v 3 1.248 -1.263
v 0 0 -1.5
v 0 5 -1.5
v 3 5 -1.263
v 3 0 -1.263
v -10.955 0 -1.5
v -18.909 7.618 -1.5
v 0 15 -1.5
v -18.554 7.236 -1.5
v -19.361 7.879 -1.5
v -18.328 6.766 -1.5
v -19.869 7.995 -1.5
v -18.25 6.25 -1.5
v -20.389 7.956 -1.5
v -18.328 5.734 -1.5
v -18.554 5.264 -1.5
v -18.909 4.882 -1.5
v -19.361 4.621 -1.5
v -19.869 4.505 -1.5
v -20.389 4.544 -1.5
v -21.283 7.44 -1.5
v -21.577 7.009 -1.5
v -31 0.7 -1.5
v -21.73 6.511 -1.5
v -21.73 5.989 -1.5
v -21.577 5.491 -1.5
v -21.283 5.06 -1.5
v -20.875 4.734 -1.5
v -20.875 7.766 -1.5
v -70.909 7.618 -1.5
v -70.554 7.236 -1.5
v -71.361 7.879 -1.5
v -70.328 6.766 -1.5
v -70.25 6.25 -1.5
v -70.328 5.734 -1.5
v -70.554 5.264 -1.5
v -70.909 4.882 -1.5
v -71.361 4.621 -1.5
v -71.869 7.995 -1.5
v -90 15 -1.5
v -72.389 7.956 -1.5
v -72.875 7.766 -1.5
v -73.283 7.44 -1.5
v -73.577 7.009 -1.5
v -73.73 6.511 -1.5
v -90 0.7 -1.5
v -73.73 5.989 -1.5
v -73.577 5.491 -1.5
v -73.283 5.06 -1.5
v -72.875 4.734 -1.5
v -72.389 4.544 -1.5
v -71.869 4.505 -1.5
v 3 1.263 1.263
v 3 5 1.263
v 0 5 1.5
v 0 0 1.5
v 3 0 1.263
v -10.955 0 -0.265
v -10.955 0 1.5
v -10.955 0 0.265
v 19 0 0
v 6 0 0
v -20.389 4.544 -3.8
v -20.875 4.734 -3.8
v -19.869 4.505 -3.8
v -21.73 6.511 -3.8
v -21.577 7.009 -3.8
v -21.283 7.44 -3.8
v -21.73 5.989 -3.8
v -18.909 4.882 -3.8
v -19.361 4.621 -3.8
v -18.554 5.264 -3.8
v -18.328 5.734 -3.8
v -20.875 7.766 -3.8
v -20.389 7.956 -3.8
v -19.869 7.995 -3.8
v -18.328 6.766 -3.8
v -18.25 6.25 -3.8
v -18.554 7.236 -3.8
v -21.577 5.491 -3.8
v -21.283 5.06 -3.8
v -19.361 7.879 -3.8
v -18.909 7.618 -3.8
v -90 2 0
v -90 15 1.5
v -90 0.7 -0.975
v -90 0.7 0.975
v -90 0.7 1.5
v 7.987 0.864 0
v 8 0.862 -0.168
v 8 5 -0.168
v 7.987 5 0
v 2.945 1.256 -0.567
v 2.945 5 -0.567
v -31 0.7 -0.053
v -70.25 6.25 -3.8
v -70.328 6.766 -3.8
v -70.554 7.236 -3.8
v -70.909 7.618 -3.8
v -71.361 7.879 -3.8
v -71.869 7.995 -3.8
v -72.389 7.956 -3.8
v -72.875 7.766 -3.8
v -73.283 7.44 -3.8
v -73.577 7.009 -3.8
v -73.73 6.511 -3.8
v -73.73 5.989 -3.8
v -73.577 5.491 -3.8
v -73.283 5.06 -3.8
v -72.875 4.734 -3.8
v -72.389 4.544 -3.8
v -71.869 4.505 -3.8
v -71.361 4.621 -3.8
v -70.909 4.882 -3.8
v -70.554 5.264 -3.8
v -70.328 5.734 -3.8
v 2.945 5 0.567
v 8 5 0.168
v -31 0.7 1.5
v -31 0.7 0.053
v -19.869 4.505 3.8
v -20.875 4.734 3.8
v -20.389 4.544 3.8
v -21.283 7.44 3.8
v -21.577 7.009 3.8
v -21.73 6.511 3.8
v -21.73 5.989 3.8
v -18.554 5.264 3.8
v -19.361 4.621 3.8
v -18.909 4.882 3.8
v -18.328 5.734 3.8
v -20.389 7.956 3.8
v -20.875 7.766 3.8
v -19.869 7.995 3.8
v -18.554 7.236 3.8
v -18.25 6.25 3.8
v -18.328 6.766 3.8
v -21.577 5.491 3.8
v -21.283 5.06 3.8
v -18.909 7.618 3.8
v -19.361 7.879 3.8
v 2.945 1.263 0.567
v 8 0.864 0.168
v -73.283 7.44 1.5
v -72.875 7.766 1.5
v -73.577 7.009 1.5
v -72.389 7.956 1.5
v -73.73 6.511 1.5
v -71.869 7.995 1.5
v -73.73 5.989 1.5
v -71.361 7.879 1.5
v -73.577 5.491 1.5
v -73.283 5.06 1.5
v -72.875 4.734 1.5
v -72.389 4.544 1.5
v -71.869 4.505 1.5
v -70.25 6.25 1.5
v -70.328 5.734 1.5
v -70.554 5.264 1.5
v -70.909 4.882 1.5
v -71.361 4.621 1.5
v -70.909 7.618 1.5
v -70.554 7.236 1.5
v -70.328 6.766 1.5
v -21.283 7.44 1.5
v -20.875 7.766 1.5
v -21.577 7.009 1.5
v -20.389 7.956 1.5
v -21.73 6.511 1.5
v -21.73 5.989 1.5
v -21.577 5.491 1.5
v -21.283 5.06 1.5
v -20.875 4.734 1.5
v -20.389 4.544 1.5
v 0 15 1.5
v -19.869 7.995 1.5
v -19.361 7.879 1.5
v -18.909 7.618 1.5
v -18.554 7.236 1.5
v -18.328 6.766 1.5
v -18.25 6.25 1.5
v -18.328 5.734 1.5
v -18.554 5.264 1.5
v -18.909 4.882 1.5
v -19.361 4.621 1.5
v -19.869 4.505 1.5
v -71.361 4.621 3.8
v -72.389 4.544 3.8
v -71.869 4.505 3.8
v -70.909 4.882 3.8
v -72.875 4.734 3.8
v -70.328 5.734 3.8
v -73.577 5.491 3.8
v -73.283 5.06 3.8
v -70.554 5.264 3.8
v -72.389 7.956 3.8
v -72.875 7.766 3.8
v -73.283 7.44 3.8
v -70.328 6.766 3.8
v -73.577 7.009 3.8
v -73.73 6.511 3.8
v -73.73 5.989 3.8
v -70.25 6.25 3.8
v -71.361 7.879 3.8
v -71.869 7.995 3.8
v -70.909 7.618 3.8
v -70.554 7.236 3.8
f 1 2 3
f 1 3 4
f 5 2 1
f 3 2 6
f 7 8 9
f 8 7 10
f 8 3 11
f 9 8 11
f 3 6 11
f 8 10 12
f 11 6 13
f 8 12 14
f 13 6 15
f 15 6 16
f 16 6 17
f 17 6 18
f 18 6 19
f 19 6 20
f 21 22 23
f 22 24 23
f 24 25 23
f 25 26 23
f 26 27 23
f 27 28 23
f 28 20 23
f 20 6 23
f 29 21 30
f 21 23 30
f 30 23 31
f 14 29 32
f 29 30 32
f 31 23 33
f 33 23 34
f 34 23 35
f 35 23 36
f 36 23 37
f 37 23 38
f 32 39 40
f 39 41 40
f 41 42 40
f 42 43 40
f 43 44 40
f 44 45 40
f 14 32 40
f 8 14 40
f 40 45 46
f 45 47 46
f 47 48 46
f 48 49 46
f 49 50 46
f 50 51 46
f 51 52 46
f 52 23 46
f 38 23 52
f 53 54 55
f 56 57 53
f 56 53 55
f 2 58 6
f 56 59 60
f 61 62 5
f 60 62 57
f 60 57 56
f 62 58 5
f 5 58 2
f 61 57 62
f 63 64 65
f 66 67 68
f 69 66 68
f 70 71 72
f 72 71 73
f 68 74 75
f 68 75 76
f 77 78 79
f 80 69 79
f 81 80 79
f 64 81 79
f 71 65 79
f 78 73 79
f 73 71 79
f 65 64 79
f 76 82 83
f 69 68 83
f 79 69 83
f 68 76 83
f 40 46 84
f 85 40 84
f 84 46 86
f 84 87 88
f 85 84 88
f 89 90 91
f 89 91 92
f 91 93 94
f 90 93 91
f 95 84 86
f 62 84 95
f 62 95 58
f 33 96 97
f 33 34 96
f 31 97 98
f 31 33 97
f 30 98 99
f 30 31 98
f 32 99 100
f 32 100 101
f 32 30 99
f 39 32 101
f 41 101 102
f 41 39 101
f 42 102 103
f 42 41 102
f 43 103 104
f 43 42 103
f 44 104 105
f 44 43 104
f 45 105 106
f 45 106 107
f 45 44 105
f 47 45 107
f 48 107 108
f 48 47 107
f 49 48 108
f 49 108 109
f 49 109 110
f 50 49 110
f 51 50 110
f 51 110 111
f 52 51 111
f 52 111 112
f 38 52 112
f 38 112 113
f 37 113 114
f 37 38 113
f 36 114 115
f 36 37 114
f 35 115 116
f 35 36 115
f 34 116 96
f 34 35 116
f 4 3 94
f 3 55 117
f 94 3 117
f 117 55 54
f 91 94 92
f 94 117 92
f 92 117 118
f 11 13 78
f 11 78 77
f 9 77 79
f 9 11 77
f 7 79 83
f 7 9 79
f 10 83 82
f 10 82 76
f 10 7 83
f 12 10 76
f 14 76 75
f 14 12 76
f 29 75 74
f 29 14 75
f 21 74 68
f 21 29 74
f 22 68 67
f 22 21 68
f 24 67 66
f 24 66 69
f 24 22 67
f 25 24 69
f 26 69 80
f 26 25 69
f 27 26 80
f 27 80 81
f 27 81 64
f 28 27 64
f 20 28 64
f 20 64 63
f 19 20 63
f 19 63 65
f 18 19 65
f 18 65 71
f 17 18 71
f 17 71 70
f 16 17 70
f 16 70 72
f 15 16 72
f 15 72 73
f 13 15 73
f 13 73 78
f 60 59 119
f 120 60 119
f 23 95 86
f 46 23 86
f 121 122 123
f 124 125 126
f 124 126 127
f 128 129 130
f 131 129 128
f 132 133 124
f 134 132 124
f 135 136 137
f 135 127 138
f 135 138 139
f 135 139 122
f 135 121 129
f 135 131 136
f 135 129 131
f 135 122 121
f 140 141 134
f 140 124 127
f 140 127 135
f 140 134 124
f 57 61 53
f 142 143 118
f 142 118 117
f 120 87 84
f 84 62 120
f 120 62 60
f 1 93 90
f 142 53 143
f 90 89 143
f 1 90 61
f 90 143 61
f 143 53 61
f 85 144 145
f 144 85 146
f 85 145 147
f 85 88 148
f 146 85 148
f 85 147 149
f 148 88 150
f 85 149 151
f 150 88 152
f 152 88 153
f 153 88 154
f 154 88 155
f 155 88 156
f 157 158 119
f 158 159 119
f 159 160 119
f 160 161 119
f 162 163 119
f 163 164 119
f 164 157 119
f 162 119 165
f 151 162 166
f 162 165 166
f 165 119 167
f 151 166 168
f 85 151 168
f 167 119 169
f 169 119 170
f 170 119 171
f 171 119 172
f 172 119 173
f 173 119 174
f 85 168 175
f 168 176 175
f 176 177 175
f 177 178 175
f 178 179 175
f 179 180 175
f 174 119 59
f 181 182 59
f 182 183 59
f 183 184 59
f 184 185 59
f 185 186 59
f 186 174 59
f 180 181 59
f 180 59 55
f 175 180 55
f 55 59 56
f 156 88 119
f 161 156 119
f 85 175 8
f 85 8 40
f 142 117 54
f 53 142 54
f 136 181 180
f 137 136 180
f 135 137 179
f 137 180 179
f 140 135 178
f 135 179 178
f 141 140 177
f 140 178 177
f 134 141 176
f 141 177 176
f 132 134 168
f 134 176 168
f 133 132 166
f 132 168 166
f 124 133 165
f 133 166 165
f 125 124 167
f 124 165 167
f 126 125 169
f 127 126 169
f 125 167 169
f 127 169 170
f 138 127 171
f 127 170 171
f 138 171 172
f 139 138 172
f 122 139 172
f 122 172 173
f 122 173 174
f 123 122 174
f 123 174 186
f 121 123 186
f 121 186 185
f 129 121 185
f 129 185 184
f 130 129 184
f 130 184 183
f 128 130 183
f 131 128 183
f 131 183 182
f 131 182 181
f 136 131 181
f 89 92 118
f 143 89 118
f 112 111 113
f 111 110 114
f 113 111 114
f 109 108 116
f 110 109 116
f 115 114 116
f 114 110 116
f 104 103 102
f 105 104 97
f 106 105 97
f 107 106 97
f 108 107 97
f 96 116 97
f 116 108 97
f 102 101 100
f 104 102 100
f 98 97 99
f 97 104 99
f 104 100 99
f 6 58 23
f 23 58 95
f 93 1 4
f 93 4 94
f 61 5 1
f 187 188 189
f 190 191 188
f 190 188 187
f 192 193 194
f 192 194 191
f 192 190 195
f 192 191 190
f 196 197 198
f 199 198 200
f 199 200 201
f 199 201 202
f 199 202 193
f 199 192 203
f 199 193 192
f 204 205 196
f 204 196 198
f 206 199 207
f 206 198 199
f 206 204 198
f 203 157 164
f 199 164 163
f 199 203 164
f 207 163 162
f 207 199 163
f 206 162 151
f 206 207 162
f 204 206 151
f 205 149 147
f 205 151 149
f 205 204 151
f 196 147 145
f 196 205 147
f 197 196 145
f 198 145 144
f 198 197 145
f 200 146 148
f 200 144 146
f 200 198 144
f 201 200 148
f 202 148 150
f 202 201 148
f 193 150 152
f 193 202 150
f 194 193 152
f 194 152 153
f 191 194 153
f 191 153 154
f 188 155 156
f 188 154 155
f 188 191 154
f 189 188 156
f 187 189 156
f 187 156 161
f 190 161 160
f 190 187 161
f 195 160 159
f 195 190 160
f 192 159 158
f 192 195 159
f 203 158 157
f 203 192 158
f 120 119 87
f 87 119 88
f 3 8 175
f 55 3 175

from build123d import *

# Parameters (mm, degrees)
F1_DEPTH  = 1.5
F3_DEPTH  = 25
F4_DEPTH  = 5
F6_W      = 90
F6_H      = 3
F7_DEPTH  = 5
F5_R      = 1.75
F8_DEPTH  = 3.8
F9_W      = 16.7752551286
F9_H      = 3
F9_W_2    = 2.4494897428
F9_W_3    = 49.5505102572
F9_W_4    = 18.7752551286
F10_DEPTH = 10
F15_DEPTH = 5.301


# Not quite as in the source:
# - ends of sketch curves that miss each other by under 0.0002 mm in the source are joined


with BuildPart() as f1:
    # F0 (on Front) → F1 (new body)
    with BuildSketch(Plane.XZ):
        Polygon((0, -0.8), (0, -1.5), (3, -1.2631578947), (2.9450791466, -0.5674937516), align=None)
        Polygon((2.9450791466, -0.5674937516), (3, -1.2631578947), (19, 0), (10.1333333333, 0), (8, -0.1684210526), align=None)
        Polygon((0, 0), (0, -0.8), (2.9450791466, -0.5674937516), (8, -0.1684210526), (7.9867036011, 0), align=None)
        Polygon((10.1333333333, 0), (19, 0), (3, 1.2631578947), (2.9450791466, 0.5674937516), (8, 0.1684210526), align=None)
        Polygon((0, 0.8), (0, 0), (7.9867036011, 0), (8, 0.1684210526), (2.9450791466, 0.5674937516), align=None)
        Polygon((2.9450791466, 0.5674937516), (3, 1.2631578947), (0, 1.5), (0, 0.8), align=None)
        Polygon((8, -0.1684210526), (10.1333333333, 0), (7.9867036011, 0), align=None)
        Polygon((7.9867036011, 0), (10.1333333333, 0), (8, 0.1684210526), align=None)
    extrude(amount=-F1_DEPTH)

    # F2 (on face) → F3 (cut)
    with BuildSketch(Plane(origin=(0.117687543, 0, 1.4907088782), x_dir=(0.9968981487, 0, -0.0787024854), z_dir=(0.0787024854, 0, 0.9968981487))):
        Polygon((18.9410648244, 1.5), (-0.1180537281, 1.5), (18.9410648244, 0), align=None)
    extrude(amount=-F3_DEPTH, mode=Mode.SUBTRACT)

    # F0 (on Front) → F4 (join)
    with BuildSketch(Plane.XZ):
        Polygon((0, 0.8), (0, 0), (7.9867036011, 0), (8, 0.1684210526), (2.9450791466, 0.5674937516), align=None)
        Polygon((0, 0), (0, -0.8), (2.9450791466, -0.5674937516), (8, -0.1684210526), (7.9867036011, 0), align=None)
        Polygon((0, -0.8), (0, -1.5), (3, -1.2631578947), (2.9450791466, -0.5674937516), align=None)
        Polygon((2.9450791466, 0.5674937516), (3, 1.2631578947), (0, 1.5), (0, 0.8), align=None)
    extrude(amount=-F4_DEPTH)

    # F6 (on face) → F7 (join, through all)
    with BuildSketch(Plane.XZ):
        with Locations((-45, 0)):
            Rectangle(F6_W, F6_H)
    extrude(amount=-F7_DEPTH)

    # F5 (on Top) → F8 (join, symmetric)
    with BuildSketch(Plane.XY):
        with Locations((-20, 6.25)):
            Circle(F5_R)
        with Locations((-72, 6.25)):
            Circle(F5_R)
    extrude(amount=F8_DEPTH, both=True)

    # F9 (on face) → F10 (join)
    with BuildSketch(Plane(origin=(0, 5, 0), x_dir=(-1, 0, 0), z_dir=(0, 1, 0))):
        with Locations((81.6123724357, 0)):
            Rectangle(F9_W, F9_H)
        with Locations((72, 0)):
            Rectangle(F9_W_2, F9_H)
        with Locations((46, 0)):
            Rectangle(F9_W_3, F9_H)
        with Locations((20, 0)):
            Rectangle(F9_W_2, F9_H)
        with Locations((9.3876275643, 0)):
            Rectangle(F9_W_4, F9_H)
    extrude(amount=F10_DEPTH)

    # F13: sweep along a path in F11
    with BuildLine(Plane.XY) as f13_path:
        Line((-90, 2), (6, 0))
    # F12 (on face) → F13 (sweep, cut)
    with BuildSketch(Plane(origin=(-90, 0, 0), x_dir=(0, -1, 0), z_dir=(-1, 0, 0))):
        Polygon((-2, 0), (0, -1.5), (0, 1.5), align=None)
    sweep(path=f13_path.line, mode=Mode.SUBTRACT)

    # F14 (on face) → F15 (cut, through all)
    with BuildSketch(Plane.XY.offset(1.5)):
        Polygon((-90, 0.7), (-90, 0), (-10.954622702, 0), (-31, 0.7), align=None)
    extrude(amount=-F15_DEPTH, mode=Mode.SUBTRACT)


solid = f1.part
